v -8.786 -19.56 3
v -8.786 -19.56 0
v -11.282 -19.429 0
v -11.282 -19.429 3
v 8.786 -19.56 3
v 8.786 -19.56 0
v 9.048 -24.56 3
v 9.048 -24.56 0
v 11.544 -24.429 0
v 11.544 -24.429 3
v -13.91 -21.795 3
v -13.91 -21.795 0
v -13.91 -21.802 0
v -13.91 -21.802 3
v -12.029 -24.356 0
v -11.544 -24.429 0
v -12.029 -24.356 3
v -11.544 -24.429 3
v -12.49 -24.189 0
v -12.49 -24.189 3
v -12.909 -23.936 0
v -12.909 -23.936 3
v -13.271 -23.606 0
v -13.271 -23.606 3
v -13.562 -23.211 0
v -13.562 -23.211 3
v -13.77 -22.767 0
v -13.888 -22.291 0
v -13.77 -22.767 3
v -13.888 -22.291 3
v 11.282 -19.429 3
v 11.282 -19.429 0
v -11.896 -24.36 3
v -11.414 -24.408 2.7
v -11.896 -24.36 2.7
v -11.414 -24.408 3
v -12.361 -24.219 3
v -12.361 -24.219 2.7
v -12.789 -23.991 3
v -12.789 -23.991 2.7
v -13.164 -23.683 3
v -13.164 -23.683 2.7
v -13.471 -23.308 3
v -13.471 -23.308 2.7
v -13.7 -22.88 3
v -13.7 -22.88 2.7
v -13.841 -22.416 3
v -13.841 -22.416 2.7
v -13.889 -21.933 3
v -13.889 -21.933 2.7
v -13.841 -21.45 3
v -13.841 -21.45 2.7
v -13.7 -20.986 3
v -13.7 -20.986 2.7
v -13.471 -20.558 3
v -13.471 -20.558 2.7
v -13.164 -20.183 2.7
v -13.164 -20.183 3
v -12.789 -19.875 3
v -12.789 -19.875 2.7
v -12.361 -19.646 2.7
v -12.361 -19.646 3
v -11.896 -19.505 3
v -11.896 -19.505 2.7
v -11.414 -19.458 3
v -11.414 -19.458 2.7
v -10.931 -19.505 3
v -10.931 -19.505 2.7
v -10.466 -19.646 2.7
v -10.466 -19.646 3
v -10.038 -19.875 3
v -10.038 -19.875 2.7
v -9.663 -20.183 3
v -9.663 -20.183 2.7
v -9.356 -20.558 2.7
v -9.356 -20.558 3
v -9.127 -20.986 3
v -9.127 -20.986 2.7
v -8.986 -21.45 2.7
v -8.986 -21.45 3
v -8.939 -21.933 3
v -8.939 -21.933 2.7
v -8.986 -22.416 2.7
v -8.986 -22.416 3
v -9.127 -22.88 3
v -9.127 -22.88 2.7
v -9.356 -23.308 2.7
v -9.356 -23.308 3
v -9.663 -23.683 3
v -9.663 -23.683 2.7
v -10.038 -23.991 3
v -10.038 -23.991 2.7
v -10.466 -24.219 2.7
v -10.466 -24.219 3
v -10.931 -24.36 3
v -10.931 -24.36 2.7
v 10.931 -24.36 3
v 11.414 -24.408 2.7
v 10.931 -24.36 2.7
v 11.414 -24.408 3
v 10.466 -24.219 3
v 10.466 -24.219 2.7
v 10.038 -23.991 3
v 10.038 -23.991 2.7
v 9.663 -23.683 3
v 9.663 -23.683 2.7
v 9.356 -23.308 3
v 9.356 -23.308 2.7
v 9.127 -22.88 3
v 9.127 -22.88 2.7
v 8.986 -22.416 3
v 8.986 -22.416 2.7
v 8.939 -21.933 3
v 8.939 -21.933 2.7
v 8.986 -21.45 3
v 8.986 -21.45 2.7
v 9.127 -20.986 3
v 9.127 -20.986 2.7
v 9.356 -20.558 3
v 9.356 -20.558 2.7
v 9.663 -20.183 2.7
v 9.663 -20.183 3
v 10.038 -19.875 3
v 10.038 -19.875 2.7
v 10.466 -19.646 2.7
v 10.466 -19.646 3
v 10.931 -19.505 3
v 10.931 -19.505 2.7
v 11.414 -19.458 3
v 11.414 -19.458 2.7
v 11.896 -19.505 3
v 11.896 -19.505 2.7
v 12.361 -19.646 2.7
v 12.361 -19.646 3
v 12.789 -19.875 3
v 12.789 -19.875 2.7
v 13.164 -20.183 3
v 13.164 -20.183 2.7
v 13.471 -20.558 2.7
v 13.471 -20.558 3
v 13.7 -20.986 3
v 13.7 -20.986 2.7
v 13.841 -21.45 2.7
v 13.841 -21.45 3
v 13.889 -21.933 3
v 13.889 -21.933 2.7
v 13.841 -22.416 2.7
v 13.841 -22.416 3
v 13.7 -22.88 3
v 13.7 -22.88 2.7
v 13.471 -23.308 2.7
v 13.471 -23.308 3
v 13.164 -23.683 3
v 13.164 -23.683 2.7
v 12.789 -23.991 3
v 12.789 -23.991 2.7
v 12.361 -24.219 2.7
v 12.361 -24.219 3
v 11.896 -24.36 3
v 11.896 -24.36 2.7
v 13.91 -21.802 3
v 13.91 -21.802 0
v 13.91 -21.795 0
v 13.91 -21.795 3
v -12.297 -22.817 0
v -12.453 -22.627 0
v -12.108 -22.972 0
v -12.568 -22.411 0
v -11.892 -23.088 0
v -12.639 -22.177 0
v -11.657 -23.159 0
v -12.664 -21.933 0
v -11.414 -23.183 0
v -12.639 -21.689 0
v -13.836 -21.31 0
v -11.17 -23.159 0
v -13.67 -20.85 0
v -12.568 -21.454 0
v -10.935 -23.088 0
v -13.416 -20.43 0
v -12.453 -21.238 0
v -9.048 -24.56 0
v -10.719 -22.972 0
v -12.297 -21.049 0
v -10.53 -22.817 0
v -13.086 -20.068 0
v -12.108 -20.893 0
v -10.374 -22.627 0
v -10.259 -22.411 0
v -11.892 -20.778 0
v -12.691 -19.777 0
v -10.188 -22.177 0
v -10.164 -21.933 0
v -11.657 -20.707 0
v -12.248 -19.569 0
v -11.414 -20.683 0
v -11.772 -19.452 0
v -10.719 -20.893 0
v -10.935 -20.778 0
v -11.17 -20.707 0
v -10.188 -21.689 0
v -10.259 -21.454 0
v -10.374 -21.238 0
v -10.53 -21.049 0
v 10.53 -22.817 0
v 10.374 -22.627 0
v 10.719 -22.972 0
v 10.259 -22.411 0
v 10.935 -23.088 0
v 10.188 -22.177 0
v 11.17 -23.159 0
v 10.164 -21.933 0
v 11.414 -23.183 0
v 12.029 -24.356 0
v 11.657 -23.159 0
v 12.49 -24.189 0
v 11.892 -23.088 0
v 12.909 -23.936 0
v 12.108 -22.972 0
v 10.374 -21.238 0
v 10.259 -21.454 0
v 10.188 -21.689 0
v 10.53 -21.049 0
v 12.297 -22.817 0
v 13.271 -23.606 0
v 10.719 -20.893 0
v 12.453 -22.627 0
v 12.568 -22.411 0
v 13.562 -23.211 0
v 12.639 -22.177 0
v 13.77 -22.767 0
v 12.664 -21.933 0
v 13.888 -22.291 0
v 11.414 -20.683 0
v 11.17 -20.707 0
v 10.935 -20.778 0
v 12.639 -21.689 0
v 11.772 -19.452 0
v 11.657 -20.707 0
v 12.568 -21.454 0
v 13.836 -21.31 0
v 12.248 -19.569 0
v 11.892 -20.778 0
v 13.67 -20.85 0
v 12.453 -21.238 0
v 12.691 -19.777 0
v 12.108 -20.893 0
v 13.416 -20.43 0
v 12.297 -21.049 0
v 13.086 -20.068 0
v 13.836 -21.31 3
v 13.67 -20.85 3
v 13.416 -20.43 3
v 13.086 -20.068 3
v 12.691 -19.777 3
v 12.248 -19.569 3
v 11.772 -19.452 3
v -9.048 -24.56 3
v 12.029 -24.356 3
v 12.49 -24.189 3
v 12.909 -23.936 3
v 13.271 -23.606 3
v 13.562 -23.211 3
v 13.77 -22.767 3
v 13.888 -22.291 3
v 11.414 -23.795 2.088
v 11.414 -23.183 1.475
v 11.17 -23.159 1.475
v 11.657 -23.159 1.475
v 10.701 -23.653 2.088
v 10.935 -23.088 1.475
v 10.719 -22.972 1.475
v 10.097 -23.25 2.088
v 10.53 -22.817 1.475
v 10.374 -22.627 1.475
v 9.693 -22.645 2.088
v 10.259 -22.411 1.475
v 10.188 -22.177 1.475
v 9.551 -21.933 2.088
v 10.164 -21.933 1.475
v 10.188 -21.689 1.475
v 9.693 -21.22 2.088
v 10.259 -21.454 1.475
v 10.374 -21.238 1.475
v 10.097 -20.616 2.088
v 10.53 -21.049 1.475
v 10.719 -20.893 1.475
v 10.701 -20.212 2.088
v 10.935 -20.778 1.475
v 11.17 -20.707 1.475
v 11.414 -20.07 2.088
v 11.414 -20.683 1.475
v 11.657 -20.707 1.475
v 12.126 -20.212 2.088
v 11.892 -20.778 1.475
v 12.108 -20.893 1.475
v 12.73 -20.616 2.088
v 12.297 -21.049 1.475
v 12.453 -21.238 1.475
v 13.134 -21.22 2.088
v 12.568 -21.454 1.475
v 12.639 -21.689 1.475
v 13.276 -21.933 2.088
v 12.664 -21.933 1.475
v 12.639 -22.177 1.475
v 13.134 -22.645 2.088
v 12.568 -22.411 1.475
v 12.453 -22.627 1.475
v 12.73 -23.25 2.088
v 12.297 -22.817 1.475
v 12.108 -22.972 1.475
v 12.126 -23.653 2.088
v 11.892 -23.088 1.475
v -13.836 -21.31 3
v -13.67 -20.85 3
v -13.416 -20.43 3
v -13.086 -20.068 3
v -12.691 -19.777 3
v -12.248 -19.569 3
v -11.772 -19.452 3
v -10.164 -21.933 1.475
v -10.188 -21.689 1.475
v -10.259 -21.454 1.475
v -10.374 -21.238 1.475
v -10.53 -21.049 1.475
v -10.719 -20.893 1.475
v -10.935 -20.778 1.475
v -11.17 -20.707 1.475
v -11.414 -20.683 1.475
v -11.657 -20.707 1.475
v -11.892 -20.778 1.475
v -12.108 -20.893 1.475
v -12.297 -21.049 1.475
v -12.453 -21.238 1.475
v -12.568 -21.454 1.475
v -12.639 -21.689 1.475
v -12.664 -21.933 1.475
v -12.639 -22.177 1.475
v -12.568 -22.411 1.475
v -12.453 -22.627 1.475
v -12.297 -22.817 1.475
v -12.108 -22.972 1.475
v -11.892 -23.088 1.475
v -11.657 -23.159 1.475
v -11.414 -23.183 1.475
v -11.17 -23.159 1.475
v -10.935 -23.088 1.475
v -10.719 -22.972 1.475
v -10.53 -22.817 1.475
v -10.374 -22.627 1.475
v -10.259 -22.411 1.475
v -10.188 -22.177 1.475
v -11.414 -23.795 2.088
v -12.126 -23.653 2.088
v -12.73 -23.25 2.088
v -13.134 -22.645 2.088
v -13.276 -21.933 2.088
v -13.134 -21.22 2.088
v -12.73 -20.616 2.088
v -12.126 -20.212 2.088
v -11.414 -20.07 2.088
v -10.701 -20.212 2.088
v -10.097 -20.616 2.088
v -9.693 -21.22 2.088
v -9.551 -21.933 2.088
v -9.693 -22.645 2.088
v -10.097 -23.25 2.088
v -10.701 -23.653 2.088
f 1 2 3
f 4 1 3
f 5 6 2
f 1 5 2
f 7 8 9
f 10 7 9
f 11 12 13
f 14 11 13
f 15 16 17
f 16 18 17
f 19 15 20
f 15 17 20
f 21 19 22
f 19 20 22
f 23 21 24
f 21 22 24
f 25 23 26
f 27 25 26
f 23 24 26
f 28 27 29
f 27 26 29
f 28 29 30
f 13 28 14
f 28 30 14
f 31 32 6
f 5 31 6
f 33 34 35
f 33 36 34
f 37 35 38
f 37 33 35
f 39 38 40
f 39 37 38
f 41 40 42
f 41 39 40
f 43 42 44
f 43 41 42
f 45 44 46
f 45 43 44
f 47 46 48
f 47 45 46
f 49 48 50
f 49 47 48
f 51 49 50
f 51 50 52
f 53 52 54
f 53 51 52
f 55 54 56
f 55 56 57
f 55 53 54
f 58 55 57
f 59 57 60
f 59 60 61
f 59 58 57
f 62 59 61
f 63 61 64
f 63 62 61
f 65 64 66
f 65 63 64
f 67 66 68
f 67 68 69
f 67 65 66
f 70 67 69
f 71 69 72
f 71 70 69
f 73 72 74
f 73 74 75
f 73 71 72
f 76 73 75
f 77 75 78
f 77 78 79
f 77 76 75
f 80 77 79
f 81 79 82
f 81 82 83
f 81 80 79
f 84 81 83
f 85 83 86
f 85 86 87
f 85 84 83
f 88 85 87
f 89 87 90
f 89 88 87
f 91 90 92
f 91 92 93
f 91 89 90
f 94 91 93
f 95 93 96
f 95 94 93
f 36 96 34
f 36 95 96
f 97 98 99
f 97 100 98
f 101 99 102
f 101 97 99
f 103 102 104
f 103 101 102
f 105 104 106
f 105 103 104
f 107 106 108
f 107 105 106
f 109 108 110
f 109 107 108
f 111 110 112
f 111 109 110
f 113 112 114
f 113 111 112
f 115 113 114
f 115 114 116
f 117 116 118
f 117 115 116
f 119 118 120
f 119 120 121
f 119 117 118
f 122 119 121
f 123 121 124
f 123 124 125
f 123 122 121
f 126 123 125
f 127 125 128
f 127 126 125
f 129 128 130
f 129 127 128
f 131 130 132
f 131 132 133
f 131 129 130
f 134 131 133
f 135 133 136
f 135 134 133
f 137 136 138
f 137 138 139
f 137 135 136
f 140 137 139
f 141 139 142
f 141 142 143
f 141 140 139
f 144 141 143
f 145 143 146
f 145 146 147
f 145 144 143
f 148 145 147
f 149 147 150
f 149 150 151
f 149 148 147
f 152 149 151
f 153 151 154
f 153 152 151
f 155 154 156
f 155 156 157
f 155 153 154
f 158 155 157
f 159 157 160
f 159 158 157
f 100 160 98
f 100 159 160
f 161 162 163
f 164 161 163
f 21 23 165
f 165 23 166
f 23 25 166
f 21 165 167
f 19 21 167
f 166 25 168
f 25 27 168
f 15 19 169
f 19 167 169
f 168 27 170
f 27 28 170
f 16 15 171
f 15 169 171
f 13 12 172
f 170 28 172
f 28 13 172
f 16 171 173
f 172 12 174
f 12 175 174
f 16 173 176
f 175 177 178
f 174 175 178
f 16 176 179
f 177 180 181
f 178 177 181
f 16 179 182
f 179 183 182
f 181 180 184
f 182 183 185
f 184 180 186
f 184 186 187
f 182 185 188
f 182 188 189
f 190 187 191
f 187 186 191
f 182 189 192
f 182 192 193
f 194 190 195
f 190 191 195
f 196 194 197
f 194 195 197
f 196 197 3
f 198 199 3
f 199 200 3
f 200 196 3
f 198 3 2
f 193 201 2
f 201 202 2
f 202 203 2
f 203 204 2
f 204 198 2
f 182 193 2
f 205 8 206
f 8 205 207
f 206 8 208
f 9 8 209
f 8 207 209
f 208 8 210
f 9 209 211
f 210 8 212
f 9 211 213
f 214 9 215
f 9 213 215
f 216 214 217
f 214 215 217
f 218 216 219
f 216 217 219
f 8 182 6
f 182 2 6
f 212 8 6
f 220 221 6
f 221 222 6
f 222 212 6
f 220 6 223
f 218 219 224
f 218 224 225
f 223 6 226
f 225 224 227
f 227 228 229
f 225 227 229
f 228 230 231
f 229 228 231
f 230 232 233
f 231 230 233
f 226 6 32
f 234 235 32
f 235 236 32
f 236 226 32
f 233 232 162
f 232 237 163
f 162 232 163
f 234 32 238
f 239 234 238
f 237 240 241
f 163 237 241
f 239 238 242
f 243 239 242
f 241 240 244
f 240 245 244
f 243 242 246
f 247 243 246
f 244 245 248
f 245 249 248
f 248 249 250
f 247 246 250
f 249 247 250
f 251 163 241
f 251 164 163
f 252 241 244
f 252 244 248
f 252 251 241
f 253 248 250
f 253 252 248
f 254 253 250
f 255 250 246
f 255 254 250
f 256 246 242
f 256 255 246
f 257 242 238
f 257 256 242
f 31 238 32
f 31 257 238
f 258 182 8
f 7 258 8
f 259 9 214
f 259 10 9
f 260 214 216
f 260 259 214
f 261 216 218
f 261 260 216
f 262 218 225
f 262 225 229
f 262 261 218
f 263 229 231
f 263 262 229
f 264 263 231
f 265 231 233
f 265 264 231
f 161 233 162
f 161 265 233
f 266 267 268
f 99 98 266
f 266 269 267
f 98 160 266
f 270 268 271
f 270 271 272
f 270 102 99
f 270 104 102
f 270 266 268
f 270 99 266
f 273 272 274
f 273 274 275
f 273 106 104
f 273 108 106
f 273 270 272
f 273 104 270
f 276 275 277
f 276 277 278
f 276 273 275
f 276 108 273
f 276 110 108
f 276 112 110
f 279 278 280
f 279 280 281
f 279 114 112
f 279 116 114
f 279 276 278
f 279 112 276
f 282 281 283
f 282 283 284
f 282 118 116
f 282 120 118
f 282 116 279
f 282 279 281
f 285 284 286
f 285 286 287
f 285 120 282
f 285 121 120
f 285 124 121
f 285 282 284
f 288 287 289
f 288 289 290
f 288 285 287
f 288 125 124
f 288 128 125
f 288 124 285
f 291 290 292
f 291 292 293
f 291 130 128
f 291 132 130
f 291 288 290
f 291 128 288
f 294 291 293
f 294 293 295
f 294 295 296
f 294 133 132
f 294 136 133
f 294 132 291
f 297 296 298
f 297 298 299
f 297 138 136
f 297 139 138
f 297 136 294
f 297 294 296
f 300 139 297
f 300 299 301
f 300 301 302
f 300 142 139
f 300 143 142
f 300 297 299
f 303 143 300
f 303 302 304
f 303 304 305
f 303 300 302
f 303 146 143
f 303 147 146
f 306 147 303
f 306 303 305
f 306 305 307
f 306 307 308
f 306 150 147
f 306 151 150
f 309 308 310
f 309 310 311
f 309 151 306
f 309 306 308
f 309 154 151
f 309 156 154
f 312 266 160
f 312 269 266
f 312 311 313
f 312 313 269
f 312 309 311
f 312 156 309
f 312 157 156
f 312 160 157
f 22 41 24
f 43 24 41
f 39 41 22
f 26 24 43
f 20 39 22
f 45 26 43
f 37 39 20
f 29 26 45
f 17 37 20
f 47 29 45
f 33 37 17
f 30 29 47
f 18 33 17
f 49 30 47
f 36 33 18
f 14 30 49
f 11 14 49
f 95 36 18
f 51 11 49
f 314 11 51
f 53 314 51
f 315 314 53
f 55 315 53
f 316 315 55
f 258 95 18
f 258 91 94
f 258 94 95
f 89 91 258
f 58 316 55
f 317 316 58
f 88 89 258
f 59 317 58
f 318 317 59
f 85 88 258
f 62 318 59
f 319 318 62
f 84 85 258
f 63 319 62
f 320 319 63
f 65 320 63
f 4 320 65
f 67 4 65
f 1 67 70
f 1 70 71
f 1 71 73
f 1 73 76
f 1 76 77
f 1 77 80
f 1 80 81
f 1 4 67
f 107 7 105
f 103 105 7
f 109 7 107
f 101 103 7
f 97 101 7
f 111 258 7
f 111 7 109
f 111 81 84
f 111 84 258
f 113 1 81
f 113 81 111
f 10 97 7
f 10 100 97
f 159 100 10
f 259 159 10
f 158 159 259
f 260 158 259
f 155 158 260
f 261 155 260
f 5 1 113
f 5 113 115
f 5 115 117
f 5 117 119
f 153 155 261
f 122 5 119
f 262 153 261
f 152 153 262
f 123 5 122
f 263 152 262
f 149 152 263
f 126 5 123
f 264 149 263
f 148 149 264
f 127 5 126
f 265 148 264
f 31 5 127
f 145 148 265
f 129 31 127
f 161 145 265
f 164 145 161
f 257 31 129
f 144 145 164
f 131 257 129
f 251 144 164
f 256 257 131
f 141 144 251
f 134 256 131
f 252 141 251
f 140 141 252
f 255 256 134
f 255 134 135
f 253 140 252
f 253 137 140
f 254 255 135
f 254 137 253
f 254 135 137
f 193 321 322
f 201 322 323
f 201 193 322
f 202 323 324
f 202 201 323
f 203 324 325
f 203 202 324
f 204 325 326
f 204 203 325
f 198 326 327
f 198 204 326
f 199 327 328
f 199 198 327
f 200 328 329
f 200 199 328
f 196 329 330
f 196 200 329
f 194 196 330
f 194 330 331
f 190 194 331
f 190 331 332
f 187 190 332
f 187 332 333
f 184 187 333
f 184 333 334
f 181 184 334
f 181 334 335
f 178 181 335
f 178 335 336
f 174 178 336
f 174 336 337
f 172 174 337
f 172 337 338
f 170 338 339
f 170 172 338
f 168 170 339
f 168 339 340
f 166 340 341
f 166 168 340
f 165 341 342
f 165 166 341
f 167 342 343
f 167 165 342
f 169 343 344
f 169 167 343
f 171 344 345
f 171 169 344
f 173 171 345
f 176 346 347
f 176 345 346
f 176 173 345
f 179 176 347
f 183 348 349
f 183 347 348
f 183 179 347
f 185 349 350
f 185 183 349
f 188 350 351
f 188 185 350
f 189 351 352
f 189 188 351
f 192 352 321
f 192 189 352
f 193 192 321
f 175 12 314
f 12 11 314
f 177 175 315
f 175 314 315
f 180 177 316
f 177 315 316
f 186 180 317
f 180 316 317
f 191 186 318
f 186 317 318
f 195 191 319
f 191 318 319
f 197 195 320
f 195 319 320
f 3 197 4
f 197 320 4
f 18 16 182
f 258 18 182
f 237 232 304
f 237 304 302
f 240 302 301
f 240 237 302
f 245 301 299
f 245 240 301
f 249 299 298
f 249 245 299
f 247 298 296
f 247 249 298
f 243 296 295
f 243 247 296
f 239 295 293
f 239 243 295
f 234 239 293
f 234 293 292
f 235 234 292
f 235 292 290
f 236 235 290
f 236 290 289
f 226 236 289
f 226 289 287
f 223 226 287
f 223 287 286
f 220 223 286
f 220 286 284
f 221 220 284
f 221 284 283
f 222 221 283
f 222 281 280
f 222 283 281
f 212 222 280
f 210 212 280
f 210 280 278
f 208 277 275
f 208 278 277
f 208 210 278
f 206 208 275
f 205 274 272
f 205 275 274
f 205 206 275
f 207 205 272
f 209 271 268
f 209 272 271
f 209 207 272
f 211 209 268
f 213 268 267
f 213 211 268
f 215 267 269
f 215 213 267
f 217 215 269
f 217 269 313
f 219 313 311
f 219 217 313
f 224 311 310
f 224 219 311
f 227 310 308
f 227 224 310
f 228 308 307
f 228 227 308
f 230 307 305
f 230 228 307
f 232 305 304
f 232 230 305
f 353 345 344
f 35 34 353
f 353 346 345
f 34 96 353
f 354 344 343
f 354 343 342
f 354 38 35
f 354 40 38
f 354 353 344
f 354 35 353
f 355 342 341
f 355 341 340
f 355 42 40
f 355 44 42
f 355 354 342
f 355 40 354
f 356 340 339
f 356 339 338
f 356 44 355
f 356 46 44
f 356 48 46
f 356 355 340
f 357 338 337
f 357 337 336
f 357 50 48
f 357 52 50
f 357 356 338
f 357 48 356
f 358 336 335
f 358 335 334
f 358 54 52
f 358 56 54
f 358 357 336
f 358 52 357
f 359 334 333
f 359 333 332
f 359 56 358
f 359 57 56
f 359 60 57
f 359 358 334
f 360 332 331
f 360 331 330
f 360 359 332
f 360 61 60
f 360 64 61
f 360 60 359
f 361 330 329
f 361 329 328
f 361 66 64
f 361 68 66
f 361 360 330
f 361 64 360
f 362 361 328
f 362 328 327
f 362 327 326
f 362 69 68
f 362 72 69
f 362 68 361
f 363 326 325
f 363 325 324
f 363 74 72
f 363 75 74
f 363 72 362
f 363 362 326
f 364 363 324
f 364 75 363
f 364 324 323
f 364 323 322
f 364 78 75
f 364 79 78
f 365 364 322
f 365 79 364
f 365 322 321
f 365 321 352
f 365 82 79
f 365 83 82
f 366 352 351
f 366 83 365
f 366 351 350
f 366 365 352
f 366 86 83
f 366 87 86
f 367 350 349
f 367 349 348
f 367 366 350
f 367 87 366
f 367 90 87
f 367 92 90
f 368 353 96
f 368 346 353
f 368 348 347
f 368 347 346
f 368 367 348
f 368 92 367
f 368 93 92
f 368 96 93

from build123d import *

# Parameters (mm, degrees)
SKETCH1_R                                      = 1.25
BOSS_EXTRUDE1_DEPTH                            = 3
FILLET1_R                                      = 2.5
CSK_FOR_M2_5_FLAT_HEAD_MACHINE_SCREW2_AT_COUNT = 2
CSK_FOR_M2_5_FLAT_HEAD_MACHINE_SCREW2_AT_PITCH = 22.827023493


with BuildPart() as part:
    # Sketch1 → Boss-Extrude1 (new body)
    with BuildSketch(Plane.XY):
        Polygon((-14.040925474, -24.298454927), (-9.0477778, -24.560134708), (9.0477778, -24.560134708), (14.040925474, -24.298454927), (13.778886578, -19.298454927), (8.785738904, -19.560134708), (-8.785738904, -19.560134708), (-13.778886578, -19.298454927), align=None)
        with Locations((11.413511747, -21.93272098)):
            Circle(SKETCH1_R, mode=Mode.SUBTRACT)
        with Locations((-11.413511747, -21.93272098)):
            Circle(SKETCH1_R, mode=Mode.SUBTRACT)
    extrude(amount=BOSS_EXTRUDE1_DEPTH)

    # Fillet1
    fillet1_edges = [part.edges().sort_by_distance(p)[0] for p in [
        (-9.0477778, -24.560134708, 1.5),
        (-14.040925474, -24.298454927, 1.5),
        (-13.778886578, -19.298454927, 1.5),
        (-8.785738904, -19.560134708, 1.5),
        (8.785738904, -19.560134708, 1.5),
        (13.778886578, -19.298454927, 1.5),
        (14.040925474, -24.298454927, 1.5),
        (9.0477778, -24.560134708, 1.5),
    ]]
    fillet(fillet1_edges, radius=FILLET1_R)

    # Sketch5 → CSK for M2.5 Flat Head Machine Screw2 (revolve, cut)
    with BuildSketch(Plane(origin=(-11.413511747, -21.93272098, 3), x_dir=(0, -1, 0), z_dir=(1, 0, 0))):
        Polygon((0, 0), (0, 5.751075774), (1.25, 5), (1.25, 1.525), (2.475, 0.3), (2.475, 0), align=None)
    csk_for_m2_5_flat_head_machine_screw2 = revolve(axis=Axis((-11.413511747, -21.93272098, 9.35), (0, 0, -1)), mode=Mode.SUBTRACT)

    # CSK for M2.5 Flat Head Machine Screw2 at: CSK for M2.5 Flat Head Machine Screw2 ×2
    with Locations(*[(i * CSK_FOR_M2_5_FLAT_HEAD_MACHINE_SCREW2_AT_PITCH, 0, 0) for i in range(1, CSK_FOR_M2_5_FLAT_HEAD_MACHINE_SCREW2_AT_COUNT)]):
        add(csk_for_m2_5_flat_head_machine_screw2, mode=Mode.SUBTRACT)


solid = part.part
